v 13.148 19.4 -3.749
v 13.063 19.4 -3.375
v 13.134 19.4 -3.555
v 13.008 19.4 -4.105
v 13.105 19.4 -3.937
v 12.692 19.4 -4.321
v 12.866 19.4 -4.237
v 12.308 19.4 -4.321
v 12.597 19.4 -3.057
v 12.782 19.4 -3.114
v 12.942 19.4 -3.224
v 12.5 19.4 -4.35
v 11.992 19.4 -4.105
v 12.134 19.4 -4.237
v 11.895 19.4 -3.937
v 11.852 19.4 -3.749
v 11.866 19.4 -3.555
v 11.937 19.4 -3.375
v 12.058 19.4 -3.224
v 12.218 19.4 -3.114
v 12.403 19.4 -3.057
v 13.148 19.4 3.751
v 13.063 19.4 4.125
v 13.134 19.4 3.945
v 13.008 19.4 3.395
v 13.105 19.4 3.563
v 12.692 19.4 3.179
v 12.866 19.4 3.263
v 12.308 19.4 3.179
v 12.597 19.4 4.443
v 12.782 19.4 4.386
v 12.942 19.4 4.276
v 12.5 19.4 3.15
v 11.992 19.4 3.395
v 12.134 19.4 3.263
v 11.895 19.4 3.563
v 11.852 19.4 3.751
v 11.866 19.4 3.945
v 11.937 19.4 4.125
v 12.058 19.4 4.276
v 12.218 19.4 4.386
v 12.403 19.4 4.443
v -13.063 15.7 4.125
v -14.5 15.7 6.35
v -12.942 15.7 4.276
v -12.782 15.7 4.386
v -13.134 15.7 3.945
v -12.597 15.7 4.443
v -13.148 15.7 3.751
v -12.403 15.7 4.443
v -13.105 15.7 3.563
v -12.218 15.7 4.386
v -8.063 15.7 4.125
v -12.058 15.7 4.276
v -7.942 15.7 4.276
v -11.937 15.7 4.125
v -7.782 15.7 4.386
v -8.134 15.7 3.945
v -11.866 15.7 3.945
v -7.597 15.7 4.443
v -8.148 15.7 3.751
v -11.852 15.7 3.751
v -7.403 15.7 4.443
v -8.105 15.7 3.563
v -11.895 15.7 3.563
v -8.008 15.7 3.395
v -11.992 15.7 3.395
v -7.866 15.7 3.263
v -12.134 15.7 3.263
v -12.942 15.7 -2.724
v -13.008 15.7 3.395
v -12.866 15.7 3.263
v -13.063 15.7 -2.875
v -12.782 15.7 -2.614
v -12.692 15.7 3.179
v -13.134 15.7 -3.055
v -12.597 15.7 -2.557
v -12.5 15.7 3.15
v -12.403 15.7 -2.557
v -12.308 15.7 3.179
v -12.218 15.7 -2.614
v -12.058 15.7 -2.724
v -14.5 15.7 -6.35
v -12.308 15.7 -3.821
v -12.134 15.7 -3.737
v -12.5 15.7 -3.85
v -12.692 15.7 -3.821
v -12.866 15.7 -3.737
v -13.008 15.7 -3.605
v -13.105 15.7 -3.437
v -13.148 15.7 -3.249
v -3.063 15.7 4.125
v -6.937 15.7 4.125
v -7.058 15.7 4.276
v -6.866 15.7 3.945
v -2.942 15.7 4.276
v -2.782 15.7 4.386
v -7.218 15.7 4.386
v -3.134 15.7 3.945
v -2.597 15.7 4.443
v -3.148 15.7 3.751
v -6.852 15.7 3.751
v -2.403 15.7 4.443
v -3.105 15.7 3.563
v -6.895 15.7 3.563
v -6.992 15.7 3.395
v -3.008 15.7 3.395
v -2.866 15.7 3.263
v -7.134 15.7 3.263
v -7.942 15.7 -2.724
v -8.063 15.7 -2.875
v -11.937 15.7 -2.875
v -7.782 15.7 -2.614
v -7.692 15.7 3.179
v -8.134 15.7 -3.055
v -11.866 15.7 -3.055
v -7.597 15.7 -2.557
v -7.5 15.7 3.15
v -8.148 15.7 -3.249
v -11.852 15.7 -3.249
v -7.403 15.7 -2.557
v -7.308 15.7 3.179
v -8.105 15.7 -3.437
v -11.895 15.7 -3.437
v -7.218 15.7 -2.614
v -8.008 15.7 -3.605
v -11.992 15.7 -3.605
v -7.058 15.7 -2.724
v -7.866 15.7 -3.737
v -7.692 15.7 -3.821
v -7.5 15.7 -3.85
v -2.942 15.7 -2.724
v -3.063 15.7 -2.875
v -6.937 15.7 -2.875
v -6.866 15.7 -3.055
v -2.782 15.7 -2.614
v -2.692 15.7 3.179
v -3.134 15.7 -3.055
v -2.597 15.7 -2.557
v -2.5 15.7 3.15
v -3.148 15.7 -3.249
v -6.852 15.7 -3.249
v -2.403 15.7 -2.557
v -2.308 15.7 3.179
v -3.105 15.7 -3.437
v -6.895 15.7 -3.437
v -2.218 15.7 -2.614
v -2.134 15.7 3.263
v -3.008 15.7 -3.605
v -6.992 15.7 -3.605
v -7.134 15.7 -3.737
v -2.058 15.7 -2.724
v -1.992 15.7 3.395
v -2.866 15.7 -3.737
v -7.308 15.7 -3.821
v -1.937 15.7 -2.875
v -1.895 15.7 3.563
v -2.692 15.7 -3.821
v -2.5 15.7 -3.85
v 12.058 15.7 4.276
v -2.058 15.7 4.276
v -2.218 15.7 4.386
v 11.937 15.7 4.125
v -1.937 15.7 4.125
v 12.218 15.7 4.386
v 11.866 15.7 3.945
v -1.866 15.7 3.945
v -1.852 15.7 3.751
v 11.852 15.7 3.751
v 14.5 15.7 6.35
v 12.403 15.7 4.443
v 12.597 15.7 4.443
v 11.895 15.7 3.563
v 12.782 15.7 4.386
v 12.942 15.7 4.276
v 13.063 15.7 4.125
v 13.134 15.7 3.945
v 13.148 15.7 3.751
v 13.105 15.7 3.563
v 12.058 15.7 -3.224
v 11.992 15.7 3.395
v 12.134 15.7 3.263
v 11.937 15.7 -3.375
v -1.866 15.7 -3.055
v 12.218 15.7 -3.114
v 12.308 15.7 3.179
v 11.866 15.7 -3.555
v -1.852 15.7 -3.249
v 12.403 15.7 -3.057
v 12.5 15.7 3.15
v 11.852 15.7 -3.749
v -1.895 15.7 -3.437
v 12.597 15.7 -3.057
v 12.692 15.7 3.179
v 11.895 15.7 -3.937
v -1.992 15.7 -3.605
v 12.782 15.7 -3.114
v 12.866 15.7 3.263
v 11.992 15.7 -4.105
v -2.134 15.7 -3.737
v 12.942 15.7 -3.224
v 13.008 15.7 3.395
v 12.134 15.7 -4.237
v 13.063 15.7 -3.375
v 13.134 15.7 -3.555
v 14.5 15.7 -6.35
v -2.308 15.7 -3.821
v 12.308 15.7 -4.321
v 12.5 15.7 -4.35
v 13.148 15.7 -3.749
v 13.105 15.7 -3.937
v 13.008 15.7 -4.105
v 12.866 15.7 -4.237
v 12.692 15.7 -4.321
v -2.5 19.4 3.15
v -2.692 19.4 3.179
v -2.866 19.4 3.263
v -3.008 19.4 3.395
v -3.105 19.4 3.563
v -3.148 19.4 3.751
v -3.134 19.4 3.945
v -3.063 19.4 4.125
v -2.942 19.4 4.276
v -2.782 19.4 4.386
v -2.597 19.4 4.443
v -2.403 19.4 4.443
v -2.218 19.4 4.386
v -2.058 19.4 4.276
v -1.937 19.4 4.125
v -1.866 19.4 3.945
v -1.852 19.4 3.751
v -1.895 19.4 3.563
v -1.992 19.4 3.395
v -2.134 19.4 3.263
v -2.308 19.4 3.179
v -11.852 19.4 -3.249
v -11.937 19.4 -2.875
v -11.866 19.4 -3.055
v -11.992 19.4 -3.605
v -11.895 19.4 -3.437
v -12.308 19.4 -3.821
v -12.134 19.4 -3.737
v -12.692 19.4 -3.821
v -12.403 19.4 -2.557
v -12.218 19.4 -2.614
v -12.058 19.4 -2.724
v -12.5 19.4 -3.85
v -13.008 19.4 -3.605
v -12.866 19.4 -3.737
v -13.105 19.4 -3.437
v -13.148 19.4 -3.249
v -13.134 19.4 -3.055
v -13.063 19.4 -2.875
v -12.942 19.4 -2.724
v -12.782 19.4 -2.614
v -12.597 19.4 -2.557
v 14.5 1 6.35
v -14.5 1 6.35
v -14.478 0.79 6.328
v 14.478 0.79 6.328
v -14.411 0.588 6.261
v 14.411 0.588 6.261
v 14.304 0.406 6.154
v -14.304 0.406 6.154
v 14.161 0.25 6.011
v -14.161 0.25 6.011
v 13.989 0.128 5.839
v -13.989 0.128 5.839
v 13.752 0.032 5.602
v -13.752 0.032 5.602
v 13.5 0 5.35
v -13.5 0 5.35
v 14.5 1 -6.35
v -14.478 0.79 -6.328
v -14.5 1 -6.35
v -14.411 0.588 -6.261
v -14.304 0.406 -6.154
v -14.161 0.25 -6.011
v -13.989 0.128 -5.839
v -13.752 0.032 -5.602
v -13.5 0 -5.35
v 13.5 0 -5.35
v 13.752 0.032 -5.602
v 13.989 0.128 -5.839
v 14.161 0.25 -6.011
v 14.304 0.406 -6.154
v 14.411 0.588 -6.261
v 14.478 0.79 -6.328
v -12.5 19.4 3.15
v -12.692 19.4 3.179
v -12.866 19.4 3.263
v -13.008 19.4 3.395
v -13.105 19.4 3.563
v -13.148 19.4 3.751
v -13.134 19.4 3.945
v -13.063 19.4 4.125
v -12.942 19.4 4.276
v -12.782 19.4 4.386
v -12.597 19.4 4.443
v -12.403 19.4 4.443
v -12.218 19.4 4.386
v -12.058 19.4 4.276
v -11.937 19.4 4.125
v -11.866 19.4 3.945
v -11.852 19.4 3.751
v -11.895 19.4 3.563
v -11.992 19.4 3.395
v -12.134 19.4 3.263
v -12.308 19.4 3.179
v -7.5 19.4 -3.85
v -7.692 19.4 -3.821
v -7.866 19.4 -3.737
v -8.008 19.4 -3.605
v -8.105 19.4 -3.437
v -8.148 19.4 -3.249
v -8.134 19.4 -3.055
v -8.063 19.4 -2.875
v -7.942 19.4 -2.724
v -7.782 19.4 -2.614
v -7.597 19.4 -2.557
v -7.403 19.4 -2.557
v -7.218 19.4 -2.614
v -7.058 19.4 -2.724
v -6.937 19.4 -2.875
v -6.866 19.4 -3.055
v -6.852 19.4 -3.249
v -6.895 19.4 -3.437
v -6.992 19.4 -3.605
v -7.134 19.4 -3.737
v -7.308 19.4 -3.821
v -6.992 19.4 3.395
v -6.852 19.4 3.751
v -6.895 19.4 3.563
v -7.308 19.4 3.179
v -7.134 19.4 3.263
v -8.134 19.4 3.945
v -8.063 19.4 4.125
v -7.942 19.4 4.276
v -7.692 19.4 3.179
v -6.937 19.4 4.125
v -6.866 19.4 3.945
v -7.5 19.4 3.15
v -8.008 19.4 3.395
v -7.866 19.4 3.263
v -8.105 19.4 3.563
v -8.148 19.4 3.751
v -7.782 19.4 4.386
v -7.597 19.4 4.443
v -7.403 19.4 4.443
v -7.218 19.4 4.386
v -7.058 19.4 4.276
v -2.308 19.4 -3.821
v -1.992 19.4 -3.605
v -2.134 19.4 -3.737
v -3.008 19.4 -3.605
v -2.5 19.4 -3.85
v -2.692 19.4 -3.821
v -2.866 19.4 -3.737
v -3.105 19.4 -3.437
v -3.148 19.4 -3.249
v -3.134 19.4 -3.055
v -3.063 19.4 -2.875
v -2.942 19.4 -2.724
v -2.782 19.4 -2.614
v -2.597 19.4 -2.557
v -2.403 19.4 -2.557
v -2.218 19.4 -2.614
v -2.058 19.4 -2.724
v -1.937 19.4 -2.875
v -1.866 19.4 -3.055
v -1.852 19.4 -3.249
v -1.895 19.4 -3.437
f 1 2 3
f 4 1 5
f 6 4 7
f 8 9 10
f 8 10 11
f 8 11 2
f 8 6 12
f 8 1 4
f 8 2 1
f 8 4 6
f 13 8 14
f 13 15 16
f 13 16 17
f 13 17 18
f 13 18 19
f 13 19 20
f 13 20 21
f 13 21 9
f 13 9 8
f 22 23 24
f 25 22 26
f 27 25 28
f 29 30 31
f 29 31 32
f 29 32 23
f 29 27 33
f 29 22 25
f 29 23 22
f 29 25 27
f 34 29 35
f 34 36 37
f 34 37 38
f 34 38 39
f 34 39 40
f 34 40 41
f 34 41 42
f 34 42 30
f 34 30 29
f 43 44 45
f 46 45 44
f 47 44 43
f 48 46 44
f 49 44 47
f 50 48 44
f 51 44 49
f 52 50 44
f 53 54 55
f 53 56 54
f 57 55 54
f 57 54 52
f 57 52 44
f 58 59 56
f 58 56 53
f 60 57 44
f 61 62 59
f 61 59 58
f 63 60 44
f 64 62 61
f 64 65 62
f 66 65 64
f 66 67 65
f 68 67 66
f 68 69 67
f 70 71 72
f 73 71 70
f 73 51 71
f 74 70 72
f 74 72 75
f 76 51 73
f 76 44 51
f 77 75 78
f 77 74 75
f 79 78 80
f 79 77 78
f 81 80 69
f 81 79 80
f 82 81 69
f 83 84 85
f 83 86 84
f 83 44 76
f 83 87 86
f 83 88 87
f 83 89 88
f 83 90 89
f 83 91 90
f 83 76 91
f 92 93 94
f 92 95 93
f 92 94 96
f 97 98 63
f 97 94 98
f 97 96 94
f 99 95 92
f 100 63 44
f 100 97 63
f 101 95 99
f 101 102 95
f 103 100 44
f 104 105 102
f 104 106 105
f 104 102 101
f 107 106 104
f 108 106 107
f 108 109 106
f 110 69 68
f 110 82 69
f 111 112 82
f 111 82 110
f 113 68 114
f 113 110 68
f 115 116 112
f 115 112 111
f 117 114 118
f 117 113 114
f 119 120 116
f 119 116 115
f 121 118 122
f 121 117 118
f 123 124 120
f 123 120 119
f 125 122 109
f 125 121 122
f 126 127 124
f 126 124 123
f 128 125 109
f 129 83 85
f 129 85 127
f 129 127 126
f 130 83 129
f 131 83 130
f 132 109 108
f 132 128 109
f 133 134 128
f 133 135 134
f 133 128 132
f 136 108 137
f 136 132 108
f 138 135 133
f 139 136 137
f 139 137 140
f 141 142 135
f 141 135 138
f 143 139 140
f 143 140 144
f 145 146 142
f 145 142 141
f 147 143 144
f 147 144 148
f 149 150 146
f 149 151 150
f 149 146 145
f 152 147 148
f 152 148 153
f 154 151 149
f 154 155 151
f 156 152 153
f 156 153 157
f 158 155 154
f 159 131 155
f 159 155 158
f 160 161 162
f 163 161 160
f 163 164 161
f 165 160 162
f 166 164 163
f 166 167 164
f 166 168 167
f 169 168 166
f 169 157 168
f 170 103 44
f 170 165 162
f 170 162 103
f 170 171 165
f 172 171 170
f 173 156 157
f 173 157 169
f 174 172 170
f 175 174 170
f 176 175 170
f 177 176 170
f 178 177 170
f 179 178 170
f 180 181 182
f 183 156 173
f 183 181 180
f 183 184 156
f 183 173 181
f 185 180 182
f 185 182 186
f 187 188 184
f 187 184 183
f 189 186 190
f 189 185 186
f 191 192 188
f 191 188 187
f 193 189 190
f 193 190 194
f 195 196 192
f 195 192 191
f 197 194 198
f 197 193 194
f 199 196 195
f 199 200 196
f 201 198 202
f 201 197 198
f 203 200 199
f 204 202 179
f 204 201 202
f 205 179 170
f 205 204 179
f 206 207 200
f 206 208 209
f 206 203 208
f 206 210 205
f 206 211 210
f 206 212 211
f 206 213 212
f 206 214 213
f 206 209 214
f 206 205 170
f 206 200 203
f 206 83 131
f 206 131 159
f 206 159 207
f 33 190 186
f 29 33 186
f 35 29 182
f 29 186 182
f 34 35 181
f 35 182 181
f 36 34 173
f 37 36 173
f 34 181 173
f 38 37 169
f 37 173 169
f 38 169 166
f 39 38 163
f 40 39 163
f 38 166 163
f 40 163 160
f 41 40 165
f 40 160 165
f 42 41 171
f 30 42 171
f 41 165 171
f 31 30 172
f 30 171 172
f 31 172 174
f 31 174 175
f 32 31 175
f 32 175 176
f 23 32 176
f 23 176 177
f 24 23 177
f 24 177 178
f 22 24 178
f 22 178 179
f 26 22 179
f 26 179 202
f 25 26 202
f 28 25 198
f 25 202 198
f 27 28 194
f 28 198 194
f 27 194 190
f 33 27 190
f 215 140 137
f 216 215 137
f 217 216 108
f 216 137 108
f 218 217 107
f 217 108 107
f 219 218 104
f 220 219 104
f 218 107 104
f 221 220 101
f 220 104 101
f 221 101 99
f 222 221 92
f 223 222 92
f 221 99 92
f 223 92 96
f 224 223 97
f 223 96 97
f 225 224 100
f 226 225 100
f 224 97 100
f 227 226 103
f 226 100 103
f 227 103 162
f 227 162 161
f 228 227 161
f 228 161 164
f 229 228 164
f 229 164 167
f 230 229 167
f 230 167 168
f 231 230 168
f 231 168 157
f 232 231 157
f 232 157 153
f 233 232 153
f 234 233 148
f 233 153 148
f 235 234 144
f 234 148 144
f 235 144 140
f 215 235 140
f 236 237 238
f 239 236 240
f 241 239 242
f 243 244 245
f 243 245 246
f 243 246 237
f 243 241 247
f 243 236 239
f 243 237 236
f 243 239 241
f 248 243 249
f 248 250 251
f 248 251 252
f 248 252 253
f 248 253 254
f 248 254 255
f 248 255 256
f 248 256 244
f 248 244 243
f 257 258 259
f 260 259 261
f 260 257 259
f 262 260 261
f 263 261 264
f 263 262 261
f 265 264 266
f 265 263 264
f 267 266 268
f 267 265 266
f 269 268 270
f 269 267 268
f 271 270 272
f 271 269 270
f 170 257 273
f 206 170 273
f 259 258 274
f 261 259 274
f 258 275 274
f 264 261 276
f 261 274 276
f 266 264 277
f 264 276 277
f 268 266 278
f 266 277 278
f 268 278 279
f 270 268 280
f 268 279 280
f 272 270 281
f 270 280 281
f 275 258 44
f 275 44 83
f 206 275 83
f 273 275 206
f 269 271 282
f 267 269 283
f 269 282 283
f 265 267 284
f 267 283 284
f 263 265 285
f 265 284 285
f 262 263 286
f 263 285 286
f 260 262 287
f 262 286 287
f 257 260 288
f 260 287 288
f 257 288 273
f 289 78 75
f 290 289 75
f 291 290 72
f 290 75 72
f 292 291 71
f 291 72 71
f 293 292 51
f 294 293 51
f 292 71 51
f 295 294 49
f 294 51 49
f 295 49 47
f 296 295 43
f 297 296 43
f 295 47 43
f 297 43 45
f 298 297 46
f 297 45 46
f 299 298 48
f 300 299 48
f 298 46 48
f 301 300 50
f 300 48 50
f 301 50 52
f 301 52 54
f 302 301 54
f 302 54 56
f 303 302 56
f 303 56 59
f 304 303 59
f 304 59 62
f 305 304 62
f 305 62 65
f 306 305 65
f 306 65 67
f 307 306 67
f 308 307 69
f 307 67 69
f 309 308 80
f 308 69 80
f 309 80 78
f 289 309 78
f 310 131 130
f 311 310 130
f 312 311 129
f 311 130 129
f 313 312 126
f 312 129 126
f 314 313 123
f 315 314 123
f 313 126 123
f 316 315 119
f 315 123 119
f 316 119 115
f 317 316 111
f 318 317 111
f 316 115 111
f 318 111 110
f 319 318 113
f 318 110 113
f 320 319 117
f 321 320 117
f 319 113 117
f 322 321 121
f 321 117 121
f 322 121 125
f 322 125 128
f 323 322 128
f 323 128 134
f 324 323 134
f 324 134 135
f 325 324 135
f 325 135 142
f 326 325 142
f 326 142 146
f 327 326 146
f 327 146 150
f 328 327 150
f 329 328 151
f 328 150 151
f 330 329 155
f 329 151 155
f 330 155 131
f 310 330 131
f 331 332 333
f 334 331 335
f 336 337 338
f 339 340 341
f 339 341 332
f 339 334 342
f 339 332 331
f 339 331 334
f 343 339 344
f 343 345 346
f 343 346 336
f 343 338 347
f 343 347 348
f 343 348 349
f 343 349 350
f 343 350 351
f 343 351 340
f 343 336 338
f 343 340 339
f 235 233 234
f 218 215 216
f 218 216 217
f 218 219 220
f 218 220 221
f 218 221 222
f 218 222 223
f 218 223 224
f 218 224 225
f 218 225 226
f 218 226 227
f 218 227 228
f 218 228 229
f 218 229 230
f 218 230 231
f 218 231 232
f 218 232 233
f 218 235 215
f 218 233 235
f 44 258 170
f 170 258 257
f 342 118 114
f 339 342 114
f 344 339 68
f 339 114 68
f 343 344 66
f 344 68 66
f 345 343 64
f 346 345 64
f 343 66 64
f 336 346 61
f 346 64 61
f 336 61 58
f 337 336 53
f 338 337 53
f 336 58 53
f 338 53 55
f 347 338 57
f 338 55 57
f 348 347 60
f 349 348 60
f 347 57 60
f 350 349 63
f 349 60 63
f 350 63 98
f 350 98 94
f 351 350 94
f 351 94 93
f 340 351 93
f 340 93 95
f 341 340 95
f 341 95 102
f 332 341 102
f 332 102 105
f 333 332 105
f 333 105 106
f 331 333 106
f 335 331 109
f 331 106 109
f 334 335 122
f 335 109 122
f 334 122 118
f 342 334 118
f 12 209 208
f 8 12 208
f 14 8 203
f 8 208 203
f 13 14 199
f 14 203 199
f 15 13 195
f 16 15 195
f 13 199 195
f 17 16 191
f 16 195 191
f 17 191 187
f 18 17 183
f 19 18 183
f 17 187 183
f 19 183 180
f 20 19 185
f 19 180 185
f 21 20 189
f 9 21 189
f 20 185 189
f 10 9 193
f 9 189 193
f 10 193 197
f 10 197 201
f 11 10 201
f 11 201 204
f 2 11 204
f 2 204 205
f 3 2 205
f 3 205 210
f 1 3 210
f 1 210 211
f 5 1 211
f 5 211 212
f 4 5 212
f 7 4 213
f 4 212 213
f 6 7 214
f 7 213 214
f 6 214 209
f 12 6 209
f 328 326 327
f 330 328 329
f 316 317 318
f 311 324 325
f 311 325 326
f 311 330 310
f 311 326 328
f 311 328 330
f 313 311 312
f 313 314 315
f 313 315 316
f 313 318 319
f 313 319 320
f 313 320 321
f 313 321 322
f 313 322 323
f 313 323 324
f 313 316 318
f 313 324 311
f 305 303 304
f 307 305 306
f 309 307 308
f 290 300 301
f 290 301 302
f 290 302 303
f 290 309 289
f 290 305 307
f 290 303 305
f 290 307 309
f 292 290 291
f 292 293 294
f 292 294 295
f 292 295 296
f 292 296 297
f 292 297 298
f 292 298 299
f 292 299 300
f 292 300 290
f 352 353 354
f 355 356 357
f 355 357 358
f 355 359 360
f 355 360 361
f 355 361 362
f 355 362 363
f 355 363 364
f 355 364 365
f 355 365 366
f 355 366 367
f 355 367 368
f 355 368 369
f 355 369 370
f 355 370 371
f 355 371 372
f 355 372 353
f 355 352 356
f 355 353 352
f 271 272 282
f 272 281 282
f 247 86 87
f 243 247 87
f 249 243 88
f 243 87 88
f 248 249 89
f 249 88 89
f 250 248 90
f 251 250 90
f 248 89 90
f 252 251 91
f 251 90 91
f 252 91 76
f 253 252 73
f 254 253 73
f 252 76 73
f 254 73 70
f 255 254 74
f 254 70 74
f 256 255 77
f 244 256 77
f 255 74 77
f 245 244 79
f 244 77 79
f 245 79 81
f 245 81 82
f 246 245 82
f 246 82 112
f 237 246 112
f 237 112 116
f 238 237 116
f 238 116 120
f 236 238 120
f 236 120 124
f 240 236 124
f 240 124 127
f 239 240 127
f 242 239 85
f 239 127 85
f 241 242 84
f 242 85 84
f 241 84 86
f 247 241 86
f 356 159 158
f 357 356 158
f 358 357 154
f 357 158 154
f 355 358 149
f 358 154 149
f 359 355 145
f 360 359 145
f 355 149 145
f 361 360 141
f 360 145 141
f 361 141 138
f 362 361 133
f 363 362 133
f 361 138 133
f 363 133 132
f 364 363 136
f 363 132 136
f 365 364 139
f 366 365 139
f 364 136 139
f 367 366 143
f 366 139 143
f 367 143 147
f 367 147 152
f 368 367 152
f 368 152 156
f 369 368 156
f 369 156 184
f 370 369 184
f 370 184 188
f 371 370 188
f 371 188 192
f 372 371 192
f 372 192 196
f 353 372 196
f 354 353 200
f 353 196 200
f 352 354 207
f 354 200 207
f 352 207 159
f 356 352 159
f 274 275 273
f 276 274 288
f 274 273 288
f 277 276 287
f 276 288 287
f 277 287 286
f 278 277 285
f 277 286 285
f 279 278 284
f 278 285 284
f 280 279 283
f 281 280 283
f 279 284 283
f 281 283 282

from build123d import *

# Parameters (mm, degrees)
SKETCH1_W           = 29
SKETCH1_H           = 12.7
BOSS_EXTRUDE1_DEPTH = 15.7
SKETCH2_R           = 0.65
BOSS_EXTRUDE2_DEPTH = 3.7
FILLET1_R           = 1


with BuildPart() as part:
    # Sketch1 → Boss-Extrude1 (new body)
    with BuildSketch(Plane(origin=(0, 0, 0), x_dir=(1, 0, 0), z_dir=(0, 1, 0))):
        Rectangle(SKETCH1_W, SKETCH1_H)
    extrude(amount=BOSS_EXTRUDE1_DEPTH)

    # Sketch2 → Boss-Extrude2 (add)
    with BuildSketch(Plane(origin=(0, 15.7, 0), x_dir=(1, 0, 0), z_dir=(0, 1, 0))):
        with Locations(Location((12.5, -3.8, 0), (0, 0, 90))):
            Circle(SKETCH2_R)
        with Locations(Location((-12.5, -3.8, 0), (0, 0, 90))):
            Circle(SKETCH2_R)
        with Locations(Location((-7.5, 3.2, 0), (0, 0, 90))):
            Circle(SKETCH2_R)
        with Locations(Location((-2.5, -3.8, 0), (0, 0, 90))):
            Circle(SKETCH2_R)
        with Locations(Location((12.5, 3.7, 0), (0, 0, 90))):
            Circle(SKETCH2_R)
        with Locations(Location((-2.5, 3.2, 0), (0, 0, 90))):
            Circle(SKETCH2_R)
        with Locations(Location((-7.5, -3.8, 0), (0, 0, 90))):
            Circle(SKETCH2_R)
        with Locations(Location((-12.5, 3.2, 0), (0, 0, 90))):
            Circle(SKETCH2_R)
    extrude(amount=BOSS_EXTRUDE2_DEPTH)

    # Fillet1
    fillet1_edges = [part.edges().sort_by_distance(p)[0] for p in [
        (0, 0, 6.35),
        (-14.5, 0, 0),
        (0, 0, -6.35),
        (14.5, 0, 0),
    ]]
    fillet(fillet1_edges, radius=FILLET1_R)


solid = part.part
